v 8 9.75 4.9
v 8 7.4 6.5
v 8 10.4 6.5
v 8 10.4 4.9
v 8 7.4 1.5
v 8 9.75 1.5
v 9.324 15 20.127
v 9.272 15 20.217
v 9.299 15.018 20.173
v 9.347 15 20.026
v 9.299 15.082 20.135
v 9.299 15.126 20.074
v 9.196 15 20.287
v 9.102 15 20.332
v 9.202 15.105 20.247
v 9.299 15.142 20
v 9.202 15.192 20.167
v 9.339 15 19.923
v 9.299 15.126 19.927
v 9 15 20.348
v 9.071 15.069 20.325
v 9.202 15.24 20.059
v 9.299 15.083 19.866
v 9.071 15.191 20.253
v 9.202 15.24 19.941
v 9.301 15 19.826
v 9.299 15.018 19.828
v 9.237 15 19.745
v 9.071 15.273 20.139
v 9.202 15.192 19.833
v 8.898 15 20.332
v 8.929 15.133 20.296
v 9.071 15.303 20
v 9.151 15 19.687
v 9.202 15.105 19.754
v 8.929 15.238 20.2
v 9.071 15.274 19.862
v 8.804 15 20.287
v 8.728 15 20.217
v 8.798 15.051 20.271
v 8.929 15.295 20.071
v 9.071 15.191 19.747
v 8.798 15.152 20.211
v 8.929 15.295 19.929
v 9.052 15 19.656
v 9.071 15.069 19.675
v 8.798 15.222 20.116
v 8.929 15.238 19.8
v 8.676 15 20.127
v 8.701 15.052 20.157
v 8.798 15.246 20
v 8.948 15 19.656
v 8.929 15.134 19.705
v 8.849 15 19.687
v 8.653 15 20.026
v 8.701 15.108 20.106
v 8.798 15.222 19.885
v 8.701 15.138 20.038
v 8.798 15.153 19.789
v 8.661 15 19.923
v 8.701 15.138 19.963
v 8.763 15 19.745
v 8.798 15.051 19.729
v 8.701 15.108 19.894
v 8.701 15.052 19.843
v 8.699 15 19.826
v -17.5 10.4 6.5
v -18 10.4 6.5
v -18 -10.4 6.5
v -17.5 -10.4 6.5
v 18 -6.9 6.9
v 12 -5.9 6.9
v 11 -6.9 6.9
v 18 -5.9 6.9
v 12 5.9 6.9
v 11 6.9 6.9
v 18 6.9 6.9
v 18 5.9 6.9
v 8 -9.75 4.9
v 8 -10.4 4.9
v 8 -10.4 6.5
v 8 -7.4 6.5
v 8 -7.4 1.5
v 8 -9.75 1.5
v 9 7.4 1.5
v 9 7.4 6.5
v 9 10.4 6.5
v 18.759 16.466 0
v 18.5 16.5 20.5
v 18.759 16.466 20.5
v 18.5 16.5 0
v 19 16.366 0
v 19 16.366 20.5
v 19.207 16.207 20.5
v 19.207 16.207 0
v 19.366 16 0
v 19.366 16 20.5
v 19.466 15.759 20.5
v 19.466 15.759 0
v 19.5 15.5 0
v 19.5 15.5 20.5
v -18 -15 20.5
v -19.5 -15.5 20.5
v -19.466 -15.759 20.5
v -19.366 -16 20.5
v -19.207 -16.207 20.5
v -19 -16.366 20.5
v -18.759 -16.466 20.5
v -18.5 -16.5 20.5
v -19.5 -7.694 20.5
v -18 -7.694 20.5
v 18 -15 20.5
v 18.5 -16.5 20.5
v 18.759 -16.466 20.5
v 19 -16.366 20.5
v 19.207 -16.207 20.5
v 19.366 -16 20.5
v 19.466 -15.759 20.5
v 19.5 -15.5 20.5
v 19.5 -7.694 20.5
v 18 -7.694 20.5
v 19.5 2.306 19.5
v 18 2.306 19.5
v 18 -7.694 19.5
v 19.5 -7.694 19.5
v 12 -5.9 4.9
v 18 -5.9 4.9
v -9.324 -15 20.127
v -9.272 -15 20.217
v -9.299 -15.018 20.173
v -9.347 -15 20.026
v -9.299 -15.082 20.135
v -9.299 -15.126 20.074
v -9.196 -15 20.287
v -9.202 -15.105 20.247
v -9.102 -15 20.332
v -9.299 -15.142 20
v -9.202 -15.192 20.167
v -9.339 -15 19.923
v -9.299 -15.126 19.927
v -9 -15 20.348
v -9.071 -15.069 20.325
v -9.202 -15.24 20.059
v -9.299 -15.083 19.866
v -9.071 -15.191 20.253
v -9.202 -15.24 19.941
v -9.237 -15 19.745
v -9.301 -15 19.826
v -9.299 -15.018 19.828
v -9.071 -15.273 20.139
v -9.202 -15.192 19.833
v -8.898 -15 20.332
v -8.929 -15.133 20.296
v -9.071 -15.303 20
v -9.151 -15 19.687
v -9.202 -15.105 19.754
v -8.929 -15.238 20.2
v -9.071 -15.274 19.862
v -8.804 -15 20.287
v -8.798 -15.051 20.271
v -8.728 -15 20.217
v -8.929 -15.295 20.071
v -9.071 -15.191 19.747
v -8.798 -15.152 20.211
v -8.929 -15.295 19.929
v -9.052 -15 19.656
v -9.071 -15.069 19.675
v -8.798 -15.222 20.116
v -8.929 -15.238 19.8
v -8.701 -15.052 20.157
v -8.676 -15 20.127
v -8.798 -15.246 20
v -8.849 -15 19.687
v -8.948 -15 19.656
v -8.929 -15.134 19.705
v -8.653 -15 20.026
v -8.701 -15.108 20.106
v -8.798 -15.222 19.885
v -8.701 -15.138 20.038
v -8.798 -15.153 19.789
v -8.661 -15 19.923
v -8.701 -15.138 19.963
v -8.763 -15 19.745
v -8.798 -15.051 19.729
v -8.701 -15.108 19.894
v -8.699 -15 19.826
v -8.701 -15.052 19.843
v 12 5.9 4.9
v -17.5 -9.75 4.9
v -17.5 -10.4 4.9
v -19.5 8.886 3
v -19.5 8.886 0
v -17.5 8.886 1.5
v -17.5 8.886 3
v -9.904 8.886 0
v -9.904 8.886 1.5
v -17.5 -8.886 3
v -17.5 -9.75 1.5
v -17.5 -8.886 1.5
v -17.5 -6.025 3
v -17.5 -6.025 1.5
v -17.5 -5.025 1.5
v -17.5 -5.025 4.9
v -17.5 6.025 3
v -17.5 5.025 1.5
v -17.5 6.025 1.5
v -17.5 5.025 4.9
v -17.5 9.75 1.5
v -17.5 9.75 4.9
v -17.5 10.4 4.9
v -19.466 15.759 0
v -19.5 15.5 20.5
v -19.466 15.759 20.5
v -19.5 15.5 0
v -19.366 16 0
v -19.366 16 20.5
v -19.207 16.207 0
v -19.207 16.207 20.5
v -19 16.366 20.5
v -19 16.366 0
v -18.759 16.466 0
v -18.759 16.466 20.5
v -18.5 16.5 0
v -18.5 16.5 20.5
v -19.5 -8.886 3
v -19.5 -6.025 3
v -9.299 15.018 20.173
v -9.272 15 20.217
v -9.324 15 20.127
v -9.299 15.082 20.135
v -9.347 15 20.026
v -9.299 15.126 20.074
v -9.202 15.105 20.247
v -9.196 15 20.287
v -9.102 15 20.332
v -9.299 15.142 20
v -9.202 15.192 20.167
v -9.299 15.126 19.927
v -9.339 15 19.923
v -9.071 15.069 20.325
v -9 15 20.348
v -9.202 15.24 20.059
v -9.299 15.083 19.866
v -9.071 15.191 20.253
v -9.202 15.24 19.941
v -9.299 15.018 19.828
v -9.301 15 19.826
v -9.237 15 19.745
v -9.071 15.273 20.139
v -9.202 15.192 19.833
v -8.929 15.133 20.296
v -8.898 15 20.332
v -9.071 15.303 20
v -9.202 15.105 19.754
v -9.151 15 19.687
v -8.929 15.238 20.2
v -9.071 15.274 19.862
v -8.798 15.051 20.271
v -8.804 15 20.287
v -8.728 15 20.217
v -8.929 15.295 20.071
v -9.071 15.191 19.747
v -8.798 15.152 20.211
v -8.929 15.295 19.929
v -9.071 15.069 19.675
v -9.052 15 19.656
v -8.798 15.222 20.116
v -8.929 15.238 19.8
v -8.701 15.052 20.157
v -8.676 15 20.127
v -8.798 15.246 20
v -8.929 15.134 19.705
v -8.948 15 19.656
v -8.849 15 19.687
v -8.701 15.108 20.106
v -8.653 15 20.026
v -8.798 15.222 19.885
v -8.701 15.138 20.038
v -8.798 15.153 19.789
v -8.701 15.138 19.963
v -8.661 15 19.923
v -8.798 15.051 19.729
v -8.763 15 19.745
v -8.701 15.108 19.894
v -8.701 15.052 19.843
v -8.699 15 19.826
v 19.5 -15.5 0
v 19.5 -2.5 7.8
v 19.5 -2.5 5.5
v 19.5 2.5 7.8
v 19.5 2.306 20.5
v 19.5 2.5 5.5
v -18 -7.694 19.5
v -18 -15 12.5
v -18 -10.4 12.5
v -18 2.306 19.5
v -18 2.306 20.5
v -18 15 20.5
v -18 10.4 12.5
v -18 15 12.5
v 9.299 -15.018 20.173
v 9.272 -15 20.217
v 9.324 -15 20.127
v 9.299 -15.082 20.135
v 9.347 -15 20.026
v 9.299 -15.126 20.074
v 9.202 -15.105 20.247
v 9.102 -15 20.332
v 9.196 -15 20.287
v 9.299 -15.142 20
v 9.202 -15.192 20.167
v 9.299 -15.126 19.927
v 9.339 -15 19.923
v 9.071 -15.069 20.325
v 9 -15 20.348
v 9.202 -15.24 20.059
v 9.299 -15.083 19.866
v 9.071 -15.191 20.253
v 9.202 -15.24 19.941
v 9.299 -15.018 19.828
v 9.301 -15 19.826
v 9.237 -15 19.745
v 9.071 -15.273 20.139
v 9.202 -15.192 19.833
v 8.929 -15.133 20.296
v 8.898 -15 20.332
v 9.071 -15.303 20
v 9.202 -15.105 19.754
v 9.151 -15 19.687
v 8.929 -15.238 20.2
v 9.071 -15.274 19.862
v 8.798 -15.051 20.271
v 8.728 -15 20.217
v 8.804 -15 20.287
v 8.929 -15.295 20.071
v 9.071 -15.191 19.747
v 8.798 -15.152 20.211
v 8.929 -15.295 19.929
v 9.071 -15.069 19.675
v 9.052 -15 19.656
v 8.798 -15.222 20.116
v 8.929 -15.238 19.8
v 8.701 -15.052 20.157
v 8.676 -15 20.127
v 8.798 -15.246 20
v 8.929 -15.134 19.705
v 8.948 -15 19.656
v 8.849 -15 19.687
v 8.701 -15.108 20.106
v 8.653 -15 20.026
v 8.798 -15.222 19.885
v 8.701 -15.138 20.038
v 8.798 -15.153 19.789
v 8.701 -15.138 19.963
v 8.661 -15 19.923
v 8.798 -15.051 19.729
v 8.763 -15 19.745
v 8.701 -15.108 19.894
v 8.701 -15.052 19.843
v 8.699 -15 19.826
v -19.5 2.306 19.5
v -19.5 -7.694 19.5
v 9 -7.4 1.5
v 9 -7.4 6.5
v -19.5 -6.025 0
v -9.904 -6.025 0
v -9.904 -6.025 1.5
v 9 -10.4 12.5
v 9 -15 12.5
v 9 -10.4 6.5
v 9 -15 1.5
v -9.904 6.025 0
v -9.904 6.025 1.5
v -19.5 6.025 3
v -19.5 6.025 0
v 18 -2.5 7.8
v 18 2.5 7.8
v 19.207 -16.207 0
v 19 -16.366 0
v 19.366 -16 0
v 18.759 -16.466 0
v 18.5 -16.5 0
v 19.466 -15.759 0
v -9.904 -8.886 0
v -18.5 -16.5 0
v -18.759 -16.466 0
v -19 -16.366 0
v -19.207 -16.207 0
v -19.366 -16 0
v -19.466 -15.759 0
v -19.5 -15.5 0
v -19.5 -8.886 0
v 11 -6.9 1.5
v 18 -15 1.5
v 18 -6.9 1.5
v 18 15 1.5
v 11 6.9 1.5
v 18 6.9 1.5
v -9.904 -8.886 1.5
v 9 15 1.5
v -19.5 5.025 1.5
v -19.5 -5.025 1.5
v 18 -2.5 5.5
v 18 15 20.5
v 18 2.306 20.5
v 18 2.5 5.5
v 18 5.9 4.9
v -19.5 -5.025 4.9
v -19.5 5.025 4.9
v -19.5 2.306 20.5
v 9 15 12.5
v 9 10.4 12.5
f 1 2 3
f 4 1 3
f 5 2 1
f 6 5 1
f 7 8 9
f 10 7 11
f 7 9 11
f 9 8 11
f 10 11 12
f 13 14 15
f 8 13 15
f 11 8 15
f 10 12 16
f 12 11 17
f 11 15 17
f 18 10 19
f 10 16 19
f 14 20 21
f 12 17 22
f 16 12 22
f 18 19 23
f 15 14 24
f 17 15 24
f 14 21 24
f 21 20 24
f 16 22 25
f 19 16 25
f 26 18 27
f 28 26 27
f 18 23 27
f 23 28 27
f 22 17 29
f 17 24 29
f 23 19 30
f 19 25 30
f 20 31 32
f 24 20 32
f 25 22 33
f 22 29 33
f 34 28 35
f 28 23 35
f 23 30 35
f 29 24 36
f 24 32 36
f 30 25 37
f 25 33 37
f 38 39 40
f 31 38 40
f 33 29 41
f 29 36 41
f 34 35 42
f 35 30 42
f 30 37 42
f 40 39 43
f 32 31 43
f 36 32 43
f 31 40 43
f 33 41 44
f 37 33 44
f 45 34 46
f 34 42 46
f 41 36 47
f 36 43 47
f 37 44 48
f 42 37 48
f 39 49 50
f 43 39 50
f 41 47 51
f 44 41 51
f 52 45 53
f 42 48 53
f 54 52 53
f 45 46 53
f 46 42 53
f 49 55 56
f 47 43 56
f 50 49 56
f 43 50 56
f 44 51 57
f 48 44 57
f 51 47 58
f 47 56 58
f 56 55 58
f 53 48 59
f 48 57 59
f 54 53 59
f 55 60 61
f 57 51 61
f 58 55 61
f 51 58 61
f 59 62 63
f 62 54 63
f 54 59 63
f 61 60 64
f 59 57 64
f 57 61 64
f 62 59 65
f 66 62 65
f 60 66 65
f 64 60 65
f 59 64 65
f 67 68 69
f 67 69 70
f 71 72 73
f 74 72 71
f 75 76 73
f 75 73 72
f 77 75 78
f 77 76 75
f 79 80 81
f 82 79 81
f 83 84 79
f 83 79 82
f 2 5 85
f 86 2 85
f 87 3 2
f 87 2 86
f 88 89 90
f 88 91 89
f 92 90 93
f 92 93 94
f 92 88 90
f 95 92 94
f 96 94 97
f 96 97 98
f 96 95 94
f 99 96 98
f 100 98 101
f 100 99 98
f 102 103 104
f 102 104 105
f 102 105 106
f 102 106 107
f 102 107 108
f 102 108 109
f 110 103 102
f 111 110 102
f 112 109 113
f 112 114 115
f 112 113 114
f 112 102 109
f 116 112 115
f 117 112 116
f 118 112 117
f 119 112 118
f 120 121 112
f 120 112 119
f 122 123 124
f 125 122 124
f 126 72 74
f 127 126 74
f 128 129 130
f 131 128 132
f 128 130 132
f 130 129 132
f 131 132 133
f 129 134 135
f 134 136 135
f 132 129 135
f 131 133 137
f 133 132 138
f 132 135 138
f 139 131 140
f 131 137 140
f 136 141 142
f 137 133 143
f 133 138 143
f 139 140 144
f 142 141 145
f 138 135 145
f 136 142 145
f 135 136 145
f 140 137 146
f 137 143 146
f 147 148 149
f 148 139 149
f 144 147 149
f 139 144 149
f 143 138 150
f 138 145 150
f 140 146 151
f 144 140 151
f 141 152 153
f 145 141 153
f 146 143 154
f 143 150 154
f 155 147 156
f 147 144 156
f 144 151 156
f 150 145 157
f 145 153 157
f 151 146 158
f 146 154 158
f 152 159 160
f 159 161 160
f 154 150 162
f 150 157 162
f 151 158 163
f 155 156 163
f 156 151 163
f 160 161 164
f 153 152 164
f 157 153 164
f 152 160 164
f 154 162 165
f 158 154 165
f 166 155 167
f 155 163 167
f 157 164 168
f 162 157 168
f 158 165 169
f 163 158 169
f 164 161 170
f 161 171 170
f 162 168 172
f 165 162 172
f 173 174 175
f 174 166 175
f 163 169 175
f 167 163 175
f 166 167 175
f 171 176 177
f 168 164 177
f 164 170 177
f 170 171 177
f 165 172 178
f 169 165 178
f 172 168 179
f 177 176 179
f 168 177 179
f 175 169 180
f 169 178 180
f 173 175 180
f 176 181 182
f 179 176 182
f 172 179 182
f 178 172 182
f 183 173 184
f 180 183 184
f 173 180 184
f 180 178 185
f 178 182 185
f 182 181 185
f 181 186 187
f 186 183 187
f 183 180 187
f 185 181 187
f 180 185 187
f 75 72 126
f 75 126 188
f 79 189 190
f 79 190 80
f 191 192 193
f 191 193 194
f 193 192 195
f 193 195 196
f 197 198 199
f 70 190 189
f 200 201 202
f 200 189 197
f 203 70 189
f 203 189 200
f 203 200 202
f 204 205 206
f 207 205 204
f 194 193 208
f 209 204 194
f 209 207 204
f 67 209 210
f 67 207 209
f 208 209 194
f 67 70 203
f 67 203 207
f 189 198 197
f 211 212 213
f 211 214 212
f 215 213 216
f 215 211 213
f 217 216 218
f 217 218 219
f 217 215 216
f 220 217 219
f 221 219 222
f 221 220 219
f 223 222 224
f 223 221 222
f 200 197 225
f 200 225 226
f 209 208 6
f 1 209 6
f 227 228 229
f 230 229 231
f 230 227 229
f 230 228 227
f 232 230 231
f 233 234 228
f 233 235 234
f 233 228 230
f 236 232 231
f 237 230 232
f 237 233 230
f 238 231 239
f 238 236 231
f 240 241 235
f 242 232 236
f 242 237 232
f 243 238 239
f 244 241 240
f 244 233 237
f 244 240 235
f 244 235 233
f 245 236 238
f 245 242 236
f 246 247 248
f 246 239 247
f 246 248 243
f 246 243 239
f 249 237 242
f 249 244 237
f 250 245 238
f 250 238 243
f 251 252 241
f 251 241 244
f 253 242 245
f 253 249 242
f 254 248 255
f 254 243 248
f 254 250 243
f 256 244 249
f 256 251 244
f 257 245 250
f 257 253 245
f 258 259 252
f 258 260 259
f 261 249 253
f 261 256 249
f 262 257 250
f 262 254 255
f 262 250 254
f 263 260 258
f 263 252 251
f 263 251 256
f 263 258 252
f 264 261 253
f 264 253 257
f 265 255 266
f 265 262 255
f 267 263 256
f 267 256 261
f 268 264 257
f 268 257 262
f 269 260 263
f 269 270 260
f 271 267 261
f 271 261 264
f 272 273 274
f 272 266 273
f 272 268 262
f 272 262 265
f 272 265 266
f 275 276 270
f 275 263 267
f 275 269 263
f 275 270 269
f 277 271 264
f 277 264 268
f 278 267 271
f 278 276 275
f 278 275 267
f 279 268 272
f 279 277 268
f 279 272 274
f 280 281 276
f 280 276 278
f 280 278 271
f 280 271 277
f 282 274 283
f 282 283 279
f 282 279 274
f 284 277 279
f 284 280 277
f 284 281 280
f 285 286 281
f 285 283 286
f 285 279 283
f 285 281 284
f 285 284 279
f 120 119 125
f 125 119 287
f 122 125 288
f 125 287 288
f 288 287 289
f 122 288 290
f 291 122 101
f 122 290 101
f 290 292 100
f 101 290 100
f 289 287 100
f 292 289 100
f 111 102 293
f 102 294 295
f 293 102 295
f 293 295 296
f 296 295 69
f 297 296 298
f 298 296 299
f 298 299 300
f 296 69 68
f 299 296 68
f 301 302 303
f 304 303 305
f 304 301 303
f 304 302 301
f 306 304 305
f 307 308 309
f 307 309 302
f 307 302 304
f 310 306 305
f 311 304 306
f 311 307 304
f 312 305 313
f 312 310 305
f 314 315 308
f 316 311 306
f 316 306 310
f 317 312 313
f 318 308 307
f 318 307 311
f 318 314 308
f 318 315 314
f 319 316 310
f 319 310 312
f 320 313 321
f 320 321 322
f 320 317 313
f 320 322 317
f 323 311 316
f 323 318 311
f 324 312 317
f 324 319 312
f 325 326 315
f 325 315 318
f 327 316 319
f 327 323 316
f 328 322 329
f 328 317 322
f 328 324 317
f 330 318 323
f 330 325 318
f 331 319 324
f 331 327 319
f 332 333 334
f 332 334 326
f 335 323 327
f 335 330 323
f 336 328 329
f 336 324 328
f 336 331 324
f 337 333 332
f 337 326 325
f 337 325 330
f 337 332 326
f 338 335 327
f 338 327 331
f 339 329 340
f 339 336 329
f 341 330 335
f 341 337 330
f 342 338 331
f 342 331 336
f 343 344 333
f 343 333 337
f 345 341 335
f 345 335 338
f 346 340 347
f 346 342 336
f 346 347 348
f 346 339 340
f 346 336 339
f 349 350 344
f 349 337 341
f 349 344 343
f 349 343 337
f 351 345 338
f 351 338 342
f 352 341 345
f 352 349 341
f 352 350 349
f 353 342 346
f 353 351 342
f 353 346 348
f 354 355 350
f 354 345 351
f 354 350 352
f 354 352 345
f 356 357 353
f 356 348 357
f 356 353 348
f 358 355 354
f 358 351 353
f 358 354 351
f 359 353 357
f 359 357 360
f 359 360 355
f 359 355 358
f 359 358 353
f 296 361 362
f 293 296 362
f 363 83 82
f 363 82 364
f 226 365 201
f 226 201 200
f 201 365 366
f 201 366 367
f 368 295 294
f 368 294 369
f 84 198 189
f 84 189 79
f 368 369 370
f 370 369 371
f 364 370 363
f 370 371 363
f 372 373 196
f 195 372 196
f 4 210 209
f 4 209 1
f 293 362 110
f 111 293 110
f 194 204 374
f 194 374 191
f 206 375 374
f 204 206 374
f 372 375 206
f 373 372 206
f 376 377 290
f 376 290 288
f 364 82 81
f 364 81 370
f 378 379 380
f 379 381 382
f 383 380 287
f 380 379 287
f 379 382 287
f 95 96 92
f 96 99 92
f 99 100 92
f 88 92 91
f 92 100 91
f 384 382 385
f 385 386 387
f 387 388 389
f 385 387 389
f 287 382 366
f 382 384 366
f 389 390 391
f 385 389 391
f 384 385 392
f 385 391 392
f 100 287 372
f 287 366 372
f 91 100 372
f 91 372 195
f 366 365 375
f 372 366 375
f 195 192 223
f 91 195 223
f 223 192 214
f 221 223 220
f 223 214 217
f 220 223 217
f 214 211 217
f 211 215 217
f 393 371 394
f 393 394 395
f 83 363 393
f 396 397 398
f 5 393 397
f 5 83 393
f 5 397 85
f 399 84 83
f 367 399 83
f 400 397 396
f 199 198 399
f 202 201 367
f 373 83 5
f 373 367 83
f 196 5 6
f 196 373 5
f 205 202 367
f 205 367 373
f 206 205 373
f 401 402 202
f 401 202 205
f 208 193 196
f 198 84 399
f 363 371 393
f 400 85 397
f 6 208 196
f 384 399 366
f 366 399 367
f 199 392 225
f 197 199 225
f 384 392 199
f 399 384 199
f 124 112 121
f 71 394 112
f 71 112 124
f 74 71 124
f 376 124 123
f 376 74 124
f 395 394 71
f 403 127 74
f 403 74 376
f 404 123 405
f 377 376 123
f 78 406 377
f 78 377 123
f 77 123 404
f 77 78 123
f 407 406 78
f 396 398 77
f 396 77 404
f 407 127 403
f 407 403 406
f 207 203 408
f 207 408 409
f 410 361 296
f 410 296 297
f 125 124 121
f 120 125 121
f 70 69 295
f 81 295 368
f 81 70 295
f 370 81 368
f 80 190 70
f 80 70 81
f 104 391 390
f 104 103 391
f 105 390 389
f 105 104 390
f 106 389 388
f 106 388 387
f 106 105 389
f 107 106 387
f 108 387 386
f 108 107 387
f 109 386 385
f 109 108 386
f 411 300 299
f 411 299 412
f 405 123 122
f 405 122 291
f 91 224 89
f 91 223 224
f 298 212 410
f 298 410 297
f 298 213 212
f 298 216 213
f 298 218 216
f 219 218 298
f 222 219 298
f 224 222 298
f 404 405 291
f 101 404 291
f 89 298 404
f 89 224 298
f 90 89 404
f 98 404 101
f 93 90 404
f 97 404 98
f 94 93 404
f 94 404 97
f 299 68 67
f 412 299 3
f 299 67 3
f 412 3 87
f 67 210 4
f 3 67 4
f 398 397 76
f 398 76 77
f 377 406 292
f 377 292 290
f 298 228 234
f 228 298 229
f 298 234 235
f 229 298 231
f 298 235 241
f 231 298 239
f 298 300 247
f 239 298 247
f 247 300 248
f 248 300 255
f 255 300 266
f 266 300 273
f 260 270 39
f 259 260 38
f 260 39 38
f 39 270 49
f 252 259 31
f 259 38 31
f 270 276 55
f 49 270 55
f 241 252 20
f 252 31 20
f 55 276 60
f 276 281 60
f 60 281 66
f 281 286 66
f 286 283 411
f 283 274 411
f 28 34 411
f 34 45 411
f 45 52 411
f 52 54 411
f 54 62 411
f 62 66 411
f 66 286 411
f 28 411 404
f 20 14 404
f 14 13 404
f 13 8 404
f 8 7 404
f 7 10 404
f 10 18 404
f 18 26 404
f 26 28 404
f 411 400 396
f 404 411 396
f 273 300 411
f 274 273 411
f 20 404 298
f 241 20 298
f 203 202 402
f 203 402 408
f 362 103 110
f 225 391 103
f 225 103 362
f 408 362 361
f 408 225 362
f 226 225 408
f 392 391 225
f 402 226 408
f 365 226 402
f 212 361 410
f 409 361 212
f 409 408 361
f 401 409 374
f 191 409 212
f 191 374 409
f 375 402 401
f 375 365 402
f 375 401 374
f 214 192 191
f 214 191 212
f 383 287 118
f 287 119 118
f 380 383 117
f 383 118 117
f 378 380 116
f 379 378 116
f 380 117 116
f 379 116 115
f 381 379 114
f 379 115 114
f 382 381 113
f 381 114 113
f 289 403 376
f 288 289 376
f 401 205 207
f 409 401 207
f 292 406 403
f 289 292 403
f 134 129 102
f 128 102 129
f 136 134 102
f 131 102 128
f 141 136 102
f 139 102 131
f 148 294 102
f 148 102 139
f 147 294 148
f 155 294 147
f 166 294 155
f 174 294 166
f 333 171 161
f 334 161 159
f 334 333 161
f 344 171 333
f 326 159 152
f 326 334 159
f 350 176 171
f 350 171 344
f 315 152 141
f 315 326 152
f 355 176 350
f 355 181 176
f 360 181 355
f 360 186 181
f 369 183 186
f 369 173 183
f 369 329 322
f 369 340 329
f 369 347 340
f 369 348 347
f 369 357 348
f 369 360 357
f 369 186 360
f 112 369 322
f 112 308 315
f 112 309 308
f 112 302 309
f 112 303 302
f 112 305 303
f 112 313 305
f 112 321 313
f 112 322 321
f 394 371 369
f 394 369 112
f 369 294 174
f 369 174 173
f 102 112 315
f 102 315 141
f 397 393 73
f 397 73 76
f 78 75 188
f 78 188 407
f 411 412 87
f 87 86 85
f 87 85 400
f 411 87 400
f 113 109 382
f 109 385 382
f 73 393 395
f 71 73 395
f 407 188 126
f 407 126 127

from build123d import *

# Parameters (mm, degrees)
ESQUISSE1_W                             = 33
ESQUISSE1_H                             = 39
BOSS_EXTRU_1_DEPTH                      = 1.5
ESQUISSE2_W                             = 39
ESQUISSE2_H                             = 33
ESQUISSE2_W_2                           = 36
ESQUISSE2_H_2                           = 30
BOSS_EXTRU_2_DEPTH                      = 19
ESQUISSE3_W                             = 27
ESQUISSE3_H                             = 4.6
BOSS_EXTRU_3_DEPTH                      = 11
ESQUISSE5_W                             = 26
ESQUISSE5_H                             = 0.65
BOSS_EXTRU_4_DEPTH                      = 3.4
ESQUISSE10_W                            = 0.5
ESQUISSE10_H                            = 20.8
ESQUISSE10_W_2                          = 1
ESQUISSE10_H_2                          = 3
BOSS_EXTRU_5_DEPTH                      = 5
ESQUISSE12_W                            = 10.05
ESQUISSE12_H                            = 3.4
ENL_V_MAT_EXTRU_5_DEPTH                 = 46.403744339
ESQUISSE13_W                            = 7
ESQUISSE13_H                            = 13.8
BOSS_EXTRU_6_DEPTH                      = 5.4
ESQUISSE14_W                            = 6
ESQUISSE14_H                            = 11.8
ENL_V_MAT_EXTRU_6_DEPTH                 = 2
ESQUISSE15_W                            = 5
ESQUISSE15_H                            = 2.3
ENL_V_MAT_EXTRU_7_DEPTH                 = 46.812116301
ENL_VEMENT_DE_MATI_RE_R_VOLUTION5_ANGLE = 180
SYM_TRIE4_COPY_1_ANGLE                  = 180
ESQUISSE17_W                            = 10
ESQUISSE17_H                            = 1
ENL_V_MAT_EXTRU_8_DEPTH                 = 48.047847985
CONG_1_R                                = 1
ESQUISSE18_W                            = 7.595753743
ESQUISSE18_H                            = 2.860925691
ENL_V_MAT_EXTRU_9_DEPTH                 = 32.835514759
ESQUISSE19_W                            = 2.860925691
ESQUISSE19_H                            = 3
ENL_V_MAT_EXTRU_10_DEPTH                = 46.403744339


with BuildPart() as part:
    # Esquisse1 → Boss.-Extru.1 (new body)
    with BuildSketch(Plane(origin=(0, 0, 0), x_dir=(0, 1, 0), z_dir=(0, 0, 1))):
        Rectangle(ESQUISSE1_W, ESQUISSE1_H)
    extrude(amount=BOSS_EXTRU_1_DEPTH)

    # Esquisse2 → Boss.-Extru.2 (add)
    with BuildSketch(Plane.XY.offset(1.5)):
        Rectangle(ESQUISSE2_W, ESQUISSE2_H)
        Rectangle(ESQUISSE2_W_2, ESQUISSE2_H_2, mode=Mode.SUBTRACT)
    extrude(amount=BOSS_EXTRU_2_DEPTH)

    # Esquisse3 → Boss.-Extru.3 (add)
    with BuildSketch(Plane.XY.offset(1.5)):
        with Locations((-4.5, 12.7)):
            Rectangle(ESQUISSE3_W, ESQUISSE3_H)
        with Locations((-4.5, -12.7)):
            Rectangle(ESQUISSE3_W, ESQUISSE3_H)
    extrude(amount=BOSS_EXTRU_3_DEPTH)

    # Esquisse5 → Boss.-Extru.4 (add)
    with BuildSketch(Plane.XY.offset(1.5)):
        with Locations((-5, 10.075)):
            Rectangle(ESQUISSE5_W, ESQUISSE5_H)
        with Locations((-5, -10.075)):
            Rectangle(ESQUISSE5_W, ESQUISSE5_H)
    extrude(amount=BOSS_EXTRU_4_DEPTH)

    # Esquisse10 → Boss.-Extru.5 (add)
    with BuildSketch(Plane.XY.offset(1.5)):
        with Locations((-17.75, 0)):
            Rectangle(ESQUISSE10_W, ESQUISSE10_H)
        with Locations((8.5, 8.9)):
            Rectangle(ESQUISSE10_W_2, ESQUISSE10_H_2)
        with Locations((8.5, -8.9)):
            Rectangle(ESQUISSE10_W_2, ESQUISSE10_H_2)
    extrude(amount=BOSS_EXTRU_5_DEPTH)

    # Esquisse12 → Enlèv. mat.-Extru.5 (cut, through all)
    with BuildSketch(Plane.YZ.offset(-17.5)):
        with Locations((0, 3.2)):
            Rectangle(ESQUISSE12_W, ESQUISSE12_H)
    extrude(amount=-ENL_V_MAT_EXTRU_5_DEPTH, mode=Mode.SUBTRACT)

    # Esquisse13 → Boss.-Extru.6 (add)
    with BuildSketch(Plane(origin=(-15.623853211, 9.112155963, 1.5), x_dir=(1, 0, 0), z_dir=(0, 0, 1))):
        with Locations((30.123853211, -9.112155963)):
            Rectangle(ESQUISSE13_W, ESQUISSE13_H)
    extrude(amount=BOSS_EXTRU_6_DEPTH)

    # Esquisse14 → Enlèv. mat.-Extru.6 (cut)
    with BuildSketch(Plane.XY.offset(6.9)):
        with Locations((15, 0)):
            Rectangle(ESQUISSE14_W, ESQUISSE14_H)
    extrude(amount=-ENL_V_MAT_EXTRU_6_DEPTH, mode=Mode.SUBTRACT)

    # Esquisse15 → Enlèv. mat.-Extru.7 (cut, through all)
    with BuildSketch(Plane(origin=(18, 0, 0), x_dir=(0, -1, 0), z_dir=(-1, 0, 0))):
        with Locations((0, 6.65)):
            Rectangle(ESQUISSE15_W, ESQUISSE15_H)
    extrude(amount=-ENL_V_MAT_EXTRU_7_DEPTH, mode=Mode.SUBTRACT)

    # Esquisse16 → Enlèvement de matière-Révolution5 (revolve, cut)
    with BuildSketch(Plane.XZ.offset(-14.96)):
        with BuildLine():
            Line((-8.65, 20), (-9.35, 20))
            ThreePointArc((-9.35, 20), (-9, 20.35), (-8.65, 20))
        make_face()
    enl_vement_de_mati_re_r_volution5 = revolve(axis=Axis((-14.897028004, 14.96, 20), (-1, 0, 0)), revolution_arc=ENL_VEMENT_DE_MATI_RE_R_VOLUTION5_ANGLE, mode=Mode.SUBTRACT)

    # Symétrie3: Enlèvement de matière-Révolution5 across plane
    add(enl_vement_de_mati_re_r_volution5.mirror(Plane.ZX), mode=Mode.SUBTRACT)

    # Symétrie4: Enlèvement de matière-Révolution5 across plane
    add(enl_vement_de_mati_re_r_volution5.mirror(Plane(origin=(0, 0, 0), x_dir=(0, 0, 1), z_dir=(1, 0, 0))), mode=Mode.SUBTRACT)

    # Symétrie4 copy 1 sketch → Symétrie4 copy 1 (revolve, cut)
    with BuildSketch(Plane(origin=(0, -14.96, 0), x_dir=(-1, 0, 0), z_dir=(0, 1, 0))):
        with BuildLine():
            Line((-8.65, 20), (-9.35, 20))
            ThreePointArc((-9.35, 20), (-9, 20.35), (-8.65, 20))
        make_face()
    revolve(axis=Axis((14.897028004, -14.96, 20), (1, 0, 0)), revolution_arc=SYM_TRIE4_COPY_1_ANGLE, mode=Mode.SUBTRACT)

    # Esquisse17 → Enlèv. mat.-Extru.8 (cut, through all)
    with BuildSketch(Plane(origin=(-19.5, 0, 0), x_dir=(0, -1, 0), z_dir=(-1, 0, 0))):
        with Locations((2.694173084, 20)):
            Rectangle(ESQUISSE17_W, ESQUISSE17_H)
    extrude(amount=-ENL_V_MAT_EXTRU_8_DEPTH, mode=Mode.SUBTRACT)

    # Congé1
    cong_1_edges = [part.edges().sort_by_distance(p)[0] for p in [
        (-19.5, -16.5, 10.25),
        (-19.5, 16.5, 10.25),
        (19.5, 16.5, 10.25),
        (19.5, -16.5, 10.25),
    ]]
    fillet(cong_1_edges, radius=CONG_1_R)

    # Esquisse18 → Enlèv. mat.-Extru.9 (cut, through all)
    with BuildSketch(Plane.XY.offset(1.5)):
        with Locations((-13.702123129, 7.455462846)):
            Rectangle(ESQUISSE18_W, ESQUISSE18_H)
        with Locations((-13.702123129, -7.455462846)):
            Rectangle(ESQUISSE18_W, ESQUISSE18_H)
    extrude(amount=-ENL_V_MAT_EXTRU_9_DEPTH, mode=Mode.SUBTRACT)

    # Esquisse19 → Enlèv. mat.-Extru.10 (cut, through all)
    with BuildSketch(Plane.YZ.offset(-17.5)):
        with Locations((-7.455462846, 1.5)):
            Rectangle(ESQUISSE19_W, ESQUISSE19_H)
        with Locations((7.455462846, 1.5)):
            Rectangle(ESQUISSE19_W, ESQUISSE19_H)
    extrude(amount=-ENL_V_MAT_EXTRU_10_DEPTH, mode=Mode.SUBTRACT)


solid = part.part
